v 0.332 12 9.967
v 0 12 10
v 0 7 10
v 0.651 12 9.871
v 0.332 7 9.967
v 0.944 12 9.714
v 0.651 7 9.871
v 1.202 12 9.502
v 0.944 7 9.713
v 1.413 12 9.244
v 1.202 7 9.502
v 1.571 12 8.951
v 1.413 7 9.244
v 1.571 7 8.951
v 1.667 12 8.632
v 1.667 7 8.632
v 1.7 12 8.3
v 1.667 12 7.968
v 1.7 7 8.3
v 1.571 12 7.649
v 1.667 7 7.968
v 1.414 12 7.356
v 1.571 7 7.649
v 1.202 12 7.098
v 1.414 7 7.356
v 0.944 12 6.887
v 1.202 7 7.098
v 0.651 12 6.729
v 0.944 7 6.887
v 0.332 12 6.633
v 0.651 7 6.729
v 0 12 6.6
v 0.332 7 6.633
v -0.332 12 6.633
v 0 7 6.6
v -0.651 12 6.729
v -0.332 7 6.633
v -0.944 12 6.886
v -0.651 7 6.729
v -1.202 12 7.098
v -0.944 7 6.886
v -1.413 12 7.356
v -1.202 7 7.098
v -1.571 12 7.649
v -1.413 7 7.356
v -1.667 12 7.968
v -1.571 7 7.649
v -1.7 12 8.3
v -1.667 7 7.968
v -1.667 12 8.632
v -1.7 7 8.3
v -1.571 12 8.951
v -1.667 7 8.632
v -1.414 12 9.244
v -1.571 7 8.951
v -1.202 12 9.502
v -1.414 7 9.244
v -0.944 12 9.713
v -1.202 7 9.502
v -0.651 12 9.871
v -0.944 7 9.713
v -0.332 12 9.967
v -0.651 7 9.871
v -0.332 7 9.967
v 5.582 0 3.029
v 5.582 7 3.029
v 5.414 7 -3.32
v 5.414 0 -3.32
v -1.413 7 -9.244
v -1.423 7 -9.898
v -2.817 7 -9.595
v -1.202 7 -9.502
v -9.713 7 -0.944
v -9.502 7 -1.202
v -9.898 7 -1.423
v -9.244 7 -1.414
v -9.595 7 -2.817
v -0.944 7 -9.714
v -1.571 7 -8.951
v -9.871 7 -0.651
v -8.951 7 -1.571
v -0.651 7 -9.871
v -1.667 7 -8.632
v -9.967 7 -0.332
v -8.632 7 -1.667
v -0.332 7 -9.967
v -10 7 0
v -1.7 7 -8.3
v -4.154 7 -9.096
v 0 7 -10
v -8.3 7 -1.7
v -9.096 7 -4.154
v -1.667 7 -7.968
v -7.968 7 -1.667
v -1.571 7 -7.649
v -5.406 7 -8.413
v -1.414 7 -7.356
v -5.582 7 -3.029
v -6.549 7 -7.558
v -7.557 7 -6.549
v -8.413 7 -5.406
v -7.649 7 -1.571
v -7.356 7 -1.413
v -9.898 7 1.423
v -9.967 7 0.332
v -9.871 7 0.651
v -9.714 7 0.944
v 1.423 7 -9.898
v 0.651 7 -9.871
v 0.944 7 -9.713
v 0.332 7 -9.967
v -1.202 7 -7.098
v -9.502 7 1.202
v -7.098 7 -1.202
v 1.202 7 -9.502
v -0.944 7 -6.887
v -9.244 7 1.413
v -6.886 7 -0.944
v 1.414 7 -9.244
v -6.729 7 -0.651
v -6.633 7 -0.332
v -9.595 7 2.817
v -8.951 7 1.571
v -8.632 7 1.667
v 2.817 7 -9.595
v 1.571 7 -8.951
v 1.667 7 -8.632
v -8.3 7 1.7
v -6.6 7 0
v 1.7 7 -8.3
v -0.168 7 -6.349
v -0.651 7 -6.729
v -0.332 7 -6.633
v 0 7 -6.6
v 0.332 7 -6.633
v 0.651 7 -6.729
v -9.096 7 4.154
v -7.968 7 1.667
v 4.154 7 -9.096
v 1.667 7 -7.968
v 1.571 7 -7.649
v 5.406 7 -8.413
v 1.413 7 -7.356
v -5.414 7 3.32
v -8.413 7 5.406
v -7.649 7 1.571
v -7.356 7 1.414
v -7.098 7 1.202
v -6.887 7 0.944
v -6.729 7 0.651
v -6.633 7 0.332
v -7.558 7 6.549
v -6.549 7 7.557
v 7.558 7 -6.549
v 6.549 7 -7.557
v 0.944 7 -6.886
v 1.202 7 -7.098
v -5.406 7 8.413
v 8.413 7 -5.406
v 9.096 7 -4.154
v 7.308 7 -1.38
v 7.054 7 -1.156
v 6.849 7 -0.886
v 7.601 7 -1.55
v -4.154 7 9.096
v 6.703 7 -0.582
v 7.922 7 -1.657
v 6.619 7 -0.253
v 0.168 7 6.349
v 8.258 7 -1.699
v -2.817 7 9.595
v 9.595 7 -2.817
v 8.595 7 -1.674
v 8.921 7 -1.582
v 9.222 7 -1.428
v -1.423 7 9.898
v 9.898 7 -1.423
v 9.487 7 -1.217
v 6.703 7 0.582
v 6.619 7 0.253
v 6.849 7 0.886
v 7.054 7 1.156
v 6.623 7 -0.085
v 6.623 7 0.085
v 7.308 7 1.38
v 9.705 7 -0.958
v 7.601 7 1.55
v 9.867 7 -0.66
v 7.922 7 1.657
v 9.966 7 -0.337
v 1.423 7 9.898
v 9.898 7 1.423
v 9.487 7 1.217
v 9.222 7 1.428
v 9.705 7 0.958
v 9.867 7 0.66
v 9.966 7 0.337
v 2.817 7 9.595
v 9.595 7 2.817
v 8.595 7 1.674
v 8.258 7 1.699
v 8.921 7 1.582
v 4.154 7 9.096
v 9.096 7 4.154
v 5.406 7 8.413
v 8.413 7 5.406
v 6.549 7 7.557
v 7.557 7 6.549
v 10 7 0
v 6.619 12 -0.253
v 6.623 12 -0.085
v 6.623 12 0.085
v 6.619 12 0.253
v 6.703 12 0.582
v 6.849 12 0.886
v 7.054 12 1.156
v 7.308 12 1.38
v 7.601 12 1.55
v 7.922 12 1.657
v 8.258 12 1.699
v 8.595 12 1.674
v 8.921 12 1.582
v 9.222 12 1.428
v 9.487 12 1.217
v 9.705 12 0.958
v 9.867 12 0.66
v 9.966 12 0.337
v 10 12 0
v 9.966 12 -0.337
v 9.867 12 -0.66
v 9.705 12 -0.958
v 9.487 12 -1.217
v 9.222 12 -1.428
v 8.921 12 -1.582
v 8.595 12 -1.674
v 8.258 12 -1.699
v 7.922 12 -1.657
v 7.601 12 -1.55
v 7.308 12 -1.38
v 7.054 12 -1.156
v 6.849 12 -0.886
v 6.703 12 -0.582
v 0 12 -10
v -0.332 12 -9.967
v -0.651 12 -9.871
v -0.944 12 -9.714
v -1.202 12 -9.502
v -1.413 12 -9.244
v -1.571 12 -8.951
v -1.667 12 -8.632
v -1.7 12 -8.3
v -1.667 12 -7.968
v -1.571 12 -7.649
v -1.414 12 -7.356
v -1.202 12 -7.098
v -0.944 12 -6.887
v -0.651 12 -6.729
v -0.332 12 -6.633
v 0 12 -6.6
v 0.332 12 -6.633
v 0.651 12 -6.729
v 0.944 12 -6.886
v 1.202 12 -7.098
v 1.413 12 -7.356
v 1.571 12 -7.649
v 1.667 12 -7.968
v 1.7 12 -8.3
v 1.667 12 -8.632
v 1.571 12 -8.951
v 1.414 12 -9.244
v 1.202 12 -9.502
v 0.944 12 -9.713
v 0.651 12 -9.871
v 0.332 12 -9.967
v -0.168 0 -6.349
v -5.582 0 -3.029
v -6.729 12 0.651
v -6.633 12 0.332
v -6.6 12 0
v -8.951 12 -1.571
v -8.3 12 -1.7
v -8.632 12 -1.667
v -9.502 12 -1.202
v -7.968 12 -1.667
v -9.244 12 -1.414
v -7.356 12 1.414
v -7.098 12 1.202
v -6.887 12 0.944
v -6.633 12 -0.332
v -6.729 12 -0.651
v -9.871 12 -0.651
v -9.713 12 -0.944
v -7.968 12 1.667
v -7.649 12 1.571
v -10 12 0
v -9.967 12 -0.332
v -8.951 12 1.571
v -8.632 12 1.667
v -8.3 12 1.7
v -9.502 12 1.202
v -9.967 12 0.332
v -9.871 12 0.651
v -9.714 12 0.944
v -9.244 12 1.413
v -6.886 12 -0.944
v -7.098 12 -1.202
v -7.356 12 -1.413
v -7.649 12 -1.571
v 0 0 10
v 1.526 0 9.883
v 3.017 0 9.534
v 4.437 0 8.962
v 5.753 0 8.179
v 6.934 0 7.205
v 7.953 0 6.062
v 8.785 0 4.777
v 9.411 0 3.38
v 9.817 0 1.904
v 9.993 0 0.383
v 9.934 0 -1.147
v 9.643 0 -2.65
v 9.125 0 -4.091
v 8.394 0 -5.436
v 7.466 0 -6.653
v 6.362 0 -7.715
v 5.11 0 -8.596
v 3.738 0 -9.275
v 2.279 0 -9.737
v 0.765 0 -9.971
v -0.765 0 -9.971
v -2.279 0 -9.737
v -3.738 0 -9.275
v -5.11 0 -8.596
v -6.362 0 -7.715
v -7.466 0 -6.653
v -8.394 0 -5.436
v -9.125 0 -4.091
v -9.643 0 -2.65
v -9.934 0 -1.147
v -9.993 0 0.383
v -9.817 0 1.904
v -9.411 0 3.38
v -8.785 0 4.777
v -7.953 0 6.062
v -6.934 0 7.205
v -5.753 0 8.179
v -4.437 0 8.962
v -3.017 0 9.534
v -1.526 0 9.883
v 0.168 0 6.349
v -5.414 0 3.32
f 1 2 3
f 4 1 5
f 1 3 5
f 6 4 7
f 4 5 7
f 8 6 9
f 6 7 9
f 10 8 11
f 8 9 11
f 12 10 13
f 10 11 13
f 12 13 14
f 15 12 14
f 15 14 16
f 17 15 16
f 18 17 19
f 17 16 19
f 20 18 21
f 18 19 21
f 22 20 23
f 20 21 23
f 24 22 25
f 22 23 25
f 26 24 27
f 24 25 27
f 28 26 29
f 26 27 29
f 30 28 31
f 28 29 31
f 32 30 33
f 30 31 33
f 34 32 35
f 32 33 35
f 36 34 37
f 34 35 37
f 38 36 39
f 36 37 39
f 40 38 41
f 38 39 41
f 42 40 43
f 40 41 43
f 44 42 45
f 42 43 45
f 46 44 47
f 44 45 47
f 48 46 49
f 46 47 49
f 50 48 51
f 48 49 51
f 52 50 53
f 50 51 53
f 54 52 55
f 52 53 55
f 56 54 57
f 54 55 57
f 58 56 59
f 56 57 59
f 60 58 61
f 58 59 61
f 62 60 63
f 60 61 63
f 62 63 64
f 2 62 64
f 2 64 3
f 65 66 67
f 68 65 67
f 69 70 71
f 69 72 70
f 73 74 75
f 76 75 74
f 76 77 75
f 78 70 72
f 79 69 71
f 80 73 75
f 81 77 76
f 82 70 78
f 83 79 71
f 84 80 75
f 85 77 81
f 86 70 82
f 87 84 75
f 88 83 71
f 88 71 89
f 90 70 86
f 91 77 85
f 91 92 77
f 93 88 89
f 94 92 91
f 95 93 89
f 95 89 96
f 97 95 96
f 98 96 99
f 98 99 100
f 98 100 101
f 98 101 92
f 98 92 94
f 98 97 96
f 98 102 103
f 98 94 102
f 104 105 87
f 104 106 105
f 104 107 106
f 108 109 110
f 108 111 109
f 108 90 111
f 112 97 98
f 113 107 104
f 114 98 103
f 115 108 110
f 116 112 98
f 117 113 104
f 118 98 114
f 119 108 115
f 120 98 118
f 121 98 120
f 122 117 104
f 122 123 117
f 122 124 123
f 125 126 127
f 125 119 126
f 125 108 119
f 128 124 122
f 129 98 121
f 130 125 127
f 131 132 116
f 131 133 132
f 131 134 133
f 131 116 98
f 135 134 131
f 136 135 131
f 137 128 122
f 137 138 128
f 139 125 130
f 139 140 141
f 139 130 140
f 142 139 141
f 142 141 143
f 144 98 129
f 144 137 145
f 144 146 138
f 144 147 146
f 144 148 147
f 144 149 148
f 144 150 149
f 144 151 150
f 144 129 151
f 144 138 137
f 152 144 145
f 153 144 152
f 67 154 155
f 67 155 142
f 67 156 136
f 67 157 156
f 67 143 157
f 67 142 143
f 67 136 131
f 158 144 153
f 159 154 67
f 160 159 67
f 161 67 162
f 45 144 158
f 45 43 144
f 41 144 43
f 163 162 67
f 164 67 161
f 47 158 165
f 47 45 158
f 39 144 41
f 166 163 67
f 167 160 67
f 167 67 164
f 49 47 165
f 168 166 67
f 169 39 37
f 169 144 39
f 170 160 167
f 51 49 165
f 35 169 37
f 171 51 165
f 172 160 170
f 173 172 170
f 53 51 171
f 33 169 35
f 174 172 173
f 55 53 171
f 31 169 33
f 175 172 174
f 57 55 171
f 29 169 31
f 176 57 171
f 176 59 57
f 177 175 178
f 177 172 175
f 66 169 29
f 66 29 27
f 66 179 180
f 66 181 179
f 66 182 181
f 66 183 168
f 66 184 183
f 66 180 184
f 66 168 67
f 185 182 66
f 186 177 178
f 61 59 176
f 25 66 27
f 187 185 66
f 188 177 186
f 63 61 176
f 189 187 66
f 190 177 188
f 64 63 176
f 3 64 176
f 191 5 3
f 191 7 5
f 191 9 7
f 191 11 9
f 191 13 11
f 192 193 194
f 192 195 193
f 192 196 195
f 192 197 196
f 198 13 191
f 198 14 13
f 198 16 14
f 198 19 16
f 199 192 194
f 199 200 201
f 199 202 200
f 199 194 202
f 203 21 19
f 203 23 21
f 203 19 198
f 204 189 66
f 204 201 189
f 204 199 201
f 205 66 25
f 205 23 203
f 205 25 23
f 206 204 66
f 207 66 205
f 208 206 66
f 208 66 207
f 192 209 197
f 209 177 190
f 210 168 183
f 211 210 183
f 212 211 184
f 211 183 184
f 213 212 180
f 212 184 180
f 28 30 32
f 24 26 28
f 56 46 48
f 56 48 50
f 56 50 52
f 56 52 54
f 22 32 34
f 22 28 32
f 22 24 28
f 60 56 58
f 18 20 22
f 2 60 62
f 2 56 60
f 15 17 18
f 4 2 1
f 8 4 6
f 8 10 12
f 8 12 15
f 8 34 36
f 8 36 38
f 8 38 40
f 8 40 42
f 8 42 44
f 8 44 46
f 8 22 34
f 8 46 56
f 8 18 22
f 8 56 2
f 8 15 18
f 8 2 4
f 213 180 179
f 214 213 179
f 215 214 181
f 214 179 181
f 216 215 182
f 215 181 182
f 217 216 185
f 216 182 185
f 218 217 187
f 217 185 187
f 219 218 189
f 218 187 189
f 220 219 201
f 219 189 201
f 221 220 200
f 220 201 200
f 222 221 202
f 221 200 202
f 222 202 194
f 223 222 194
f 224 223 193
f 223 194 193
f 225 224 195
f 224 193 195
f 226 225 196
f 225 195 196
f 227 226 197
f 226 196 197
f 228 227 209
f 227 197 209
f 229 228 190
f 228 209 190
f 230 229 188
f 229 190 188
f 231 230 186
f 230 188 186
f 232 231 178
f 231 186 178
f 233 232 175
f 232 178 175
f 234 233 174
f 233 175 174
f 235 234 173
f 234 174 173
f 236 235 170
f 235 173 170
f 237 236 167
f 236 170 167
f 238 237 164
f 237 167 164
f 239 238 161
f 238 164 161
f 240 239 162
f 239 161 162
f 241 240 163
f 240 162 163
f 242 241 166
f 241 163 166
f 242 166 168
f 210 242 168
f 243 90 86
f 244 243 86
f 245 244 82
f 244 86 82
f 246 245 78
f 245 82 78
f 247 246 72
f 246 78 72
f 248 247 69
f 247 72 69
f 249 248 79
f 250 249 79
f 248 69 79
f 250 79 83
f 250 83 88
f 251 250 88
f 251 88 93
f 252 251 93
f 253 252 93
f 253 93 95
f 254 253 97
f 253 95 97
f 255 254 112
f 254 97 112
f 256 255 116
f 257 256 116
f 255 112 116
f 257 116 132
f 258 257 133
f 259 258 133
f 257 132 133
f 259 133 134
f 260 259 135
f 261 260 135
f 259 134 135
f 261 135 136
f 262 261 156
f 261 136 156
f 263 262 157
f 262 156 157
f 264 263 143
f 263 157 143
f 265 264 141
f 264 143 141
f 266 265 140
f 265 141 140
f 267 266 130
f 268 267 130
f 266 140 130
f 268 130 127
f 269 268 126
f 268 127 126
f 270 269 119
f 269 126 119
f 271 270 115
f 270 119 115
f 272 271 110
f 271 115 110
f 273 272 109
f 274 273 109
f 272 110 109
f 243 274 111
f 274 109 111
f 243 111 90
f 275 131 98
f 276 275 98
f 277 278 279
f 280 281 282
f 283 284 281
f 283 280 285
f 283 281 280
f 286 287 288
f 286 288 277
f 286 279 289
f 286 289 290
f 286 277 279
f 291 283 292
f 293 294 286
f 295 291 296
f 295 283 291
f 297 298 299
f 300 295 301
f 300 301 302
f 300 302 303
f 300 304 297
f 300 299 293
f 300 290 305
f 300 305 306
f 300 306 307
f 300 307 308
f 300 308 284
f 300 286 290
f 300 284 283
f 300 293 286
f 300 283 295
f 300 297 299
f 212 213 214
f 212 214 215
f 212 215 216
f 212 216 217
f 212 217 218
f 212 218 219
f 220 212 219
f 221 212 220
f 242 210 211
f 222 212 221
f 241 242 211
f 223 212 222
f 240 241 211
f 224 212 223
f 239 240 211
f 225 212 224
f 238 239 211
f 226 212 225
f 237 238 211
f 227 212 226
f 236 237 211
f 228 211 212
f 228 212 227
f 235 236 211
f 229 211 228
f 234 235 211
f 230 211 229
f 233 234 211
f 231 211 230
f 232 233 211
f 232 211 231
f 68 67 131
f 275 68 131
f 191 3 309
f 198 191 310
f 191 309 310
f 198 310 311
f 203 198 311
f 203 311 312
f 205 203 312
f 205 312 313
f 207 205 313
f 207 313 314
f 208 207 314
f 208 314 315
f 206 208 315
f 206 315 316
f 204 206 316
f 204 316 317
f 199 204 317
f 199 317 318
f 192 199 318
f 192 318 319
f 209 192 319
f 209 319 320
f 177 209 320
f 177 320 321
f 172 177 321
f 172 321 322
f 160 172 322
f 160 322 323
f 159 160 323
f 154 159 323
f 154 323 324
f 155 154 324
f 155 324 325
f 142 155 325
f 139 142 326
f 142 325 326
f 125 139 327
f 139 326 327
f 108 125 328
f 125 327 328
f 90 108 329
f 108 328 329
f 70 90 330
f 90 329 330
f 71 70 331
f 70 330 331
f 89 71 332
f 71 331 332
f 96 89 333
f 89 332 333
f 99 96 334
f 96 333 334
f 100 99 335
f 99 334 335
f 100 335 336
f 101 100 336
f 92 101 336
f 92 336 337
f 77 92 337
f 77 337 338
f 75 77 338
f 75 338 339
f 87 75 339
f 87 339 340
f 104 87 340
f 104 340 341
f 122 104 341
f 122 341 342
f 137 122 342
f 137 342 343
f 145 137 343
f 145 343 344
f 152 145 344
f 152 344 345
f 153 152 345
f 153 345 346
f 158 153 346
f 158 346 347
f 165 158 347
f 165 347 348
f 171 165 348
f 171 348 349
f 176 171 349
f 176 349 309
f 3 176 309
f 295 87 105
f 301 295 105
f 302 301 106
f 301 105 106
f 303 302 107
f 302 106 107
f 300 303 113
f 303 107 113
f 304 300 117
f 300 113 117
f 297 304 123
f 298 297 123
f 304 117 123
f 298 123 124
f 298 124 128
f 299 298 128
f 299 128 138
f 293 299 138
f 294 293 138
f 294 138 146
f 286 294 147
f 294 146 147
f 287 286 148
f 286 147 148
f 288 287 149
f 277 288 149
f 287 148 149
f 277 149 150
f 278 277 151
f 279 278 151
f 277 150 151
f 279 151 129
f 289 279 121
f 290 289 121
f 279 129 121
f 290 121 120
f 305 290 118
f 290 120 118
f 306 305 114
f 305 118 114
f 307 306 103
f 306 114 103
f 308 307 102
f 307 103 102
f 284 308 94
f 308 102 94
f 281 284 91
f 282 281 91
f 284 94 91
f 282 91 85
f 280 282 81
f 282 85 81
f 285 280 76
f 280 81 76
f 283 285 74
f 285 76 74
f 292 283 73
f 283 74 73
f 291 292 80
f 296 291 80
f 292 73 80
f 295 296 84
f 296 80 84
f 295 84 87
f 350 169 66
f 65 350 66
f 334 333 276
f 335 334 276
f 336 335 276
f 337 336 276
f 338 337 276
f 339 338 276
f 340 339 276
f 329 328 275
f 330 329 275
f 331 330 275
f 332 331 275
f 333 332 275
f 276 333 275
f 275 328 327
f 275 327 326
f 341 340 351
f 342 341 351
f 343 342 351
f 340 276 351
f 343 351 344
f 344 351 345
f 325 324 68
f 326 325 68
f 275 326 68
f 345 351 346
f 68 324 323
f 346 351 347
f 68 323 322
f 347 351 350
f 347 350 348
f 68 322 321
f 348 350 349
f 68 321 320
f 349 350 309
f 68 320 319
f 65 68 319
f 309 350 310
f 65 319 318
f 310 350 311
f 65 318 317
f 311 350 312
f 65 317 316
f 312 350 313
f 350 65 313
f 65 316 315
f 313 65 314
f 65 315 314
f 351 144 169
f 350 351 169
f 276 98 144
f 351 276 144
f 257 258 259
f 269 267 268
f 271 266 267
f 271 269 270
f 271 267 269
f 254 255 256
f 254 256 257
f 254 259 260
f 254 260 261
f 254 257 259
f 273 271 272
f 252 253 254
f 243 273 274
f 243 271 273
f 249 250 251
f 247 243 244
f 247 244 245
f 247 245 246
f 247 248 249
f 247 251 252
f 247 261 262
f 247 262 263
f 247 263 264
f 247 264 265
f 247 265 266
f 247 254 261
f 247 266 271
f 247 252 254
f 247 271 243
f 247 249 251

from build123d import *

# Parameters (mm, degrees)
SKETCH_1_R          = 10
EXTRUDE_1_DEPTH     = 7
SKETCH_2_R          = 1.7
EXTRUDE_2_DEPTH     = 5
CUT_EXTRUDE_1_DEPTH = 7


with BuildPart() as part:
    # 草图1 → 凸台-拉伸1 (new body)
    with BuildSketch(Plane(origin=(0, 0, 0), x_dir=(1, 0, 0), z_dir=(0, 1, 0))):
        with Locations(Location((0, 0, 0), (0, 0, 270))):
            Circle(SKETCH_1_R)
    extrude(amount=EXTRUDE_1_DEPTH)

    # 草图2 → 凸台-拉伸2 (add)
    with BuildSketch(Plane(origin=(0, 7, 0), x_dir=(1, 0, 0), z_dir=(0, 1, 0))):
        with BuildLine():
            ThreePointArc((6.618999669, 0.253451944), (6.623850429, 0), (6.618999669, -0.253451944))
            ThreePointArc((6.618999669, -0.253451944), (10, 0), (6.618999669, 0.253451944))
        make_face()
        with Locations(Location((0, 8.3, 0), (0, 0, 89.999317856))):
            Circle(SKETCH_2_R)
        with Locations(Location((0, -8.3, 0), (0, 0, 269.999317859))):
            Circle(SKETCH_2_R)
        with Locations(Location((-8.3, 0, 0), (0, 0, 179.999317857))):
            Circle(SKETCH_2_R)
    extrude(amount=EXTRUDE_2_DEPTH)

    # 草图3 → 切除-拉伸1 (cut)
    with BuildSketch(Plane(origin=(0, 7, 0), x_dir=(1, 0, 0), z_dir=(0, 1, 0))):
        Polygon((-5.581963916, 3.029028256), (-5.414197376, -3.319608426), (0.16776654, -6.348636682), (5.581963916, -3.029028256), (5.414197376, 3.319608426), (-0.16776654, 6.348636682), align=None)
    extrude(amount=-CUT_EXTRUDE_1_DEPTH, mode=Mode.SUBTRACT)


solid = part.part
